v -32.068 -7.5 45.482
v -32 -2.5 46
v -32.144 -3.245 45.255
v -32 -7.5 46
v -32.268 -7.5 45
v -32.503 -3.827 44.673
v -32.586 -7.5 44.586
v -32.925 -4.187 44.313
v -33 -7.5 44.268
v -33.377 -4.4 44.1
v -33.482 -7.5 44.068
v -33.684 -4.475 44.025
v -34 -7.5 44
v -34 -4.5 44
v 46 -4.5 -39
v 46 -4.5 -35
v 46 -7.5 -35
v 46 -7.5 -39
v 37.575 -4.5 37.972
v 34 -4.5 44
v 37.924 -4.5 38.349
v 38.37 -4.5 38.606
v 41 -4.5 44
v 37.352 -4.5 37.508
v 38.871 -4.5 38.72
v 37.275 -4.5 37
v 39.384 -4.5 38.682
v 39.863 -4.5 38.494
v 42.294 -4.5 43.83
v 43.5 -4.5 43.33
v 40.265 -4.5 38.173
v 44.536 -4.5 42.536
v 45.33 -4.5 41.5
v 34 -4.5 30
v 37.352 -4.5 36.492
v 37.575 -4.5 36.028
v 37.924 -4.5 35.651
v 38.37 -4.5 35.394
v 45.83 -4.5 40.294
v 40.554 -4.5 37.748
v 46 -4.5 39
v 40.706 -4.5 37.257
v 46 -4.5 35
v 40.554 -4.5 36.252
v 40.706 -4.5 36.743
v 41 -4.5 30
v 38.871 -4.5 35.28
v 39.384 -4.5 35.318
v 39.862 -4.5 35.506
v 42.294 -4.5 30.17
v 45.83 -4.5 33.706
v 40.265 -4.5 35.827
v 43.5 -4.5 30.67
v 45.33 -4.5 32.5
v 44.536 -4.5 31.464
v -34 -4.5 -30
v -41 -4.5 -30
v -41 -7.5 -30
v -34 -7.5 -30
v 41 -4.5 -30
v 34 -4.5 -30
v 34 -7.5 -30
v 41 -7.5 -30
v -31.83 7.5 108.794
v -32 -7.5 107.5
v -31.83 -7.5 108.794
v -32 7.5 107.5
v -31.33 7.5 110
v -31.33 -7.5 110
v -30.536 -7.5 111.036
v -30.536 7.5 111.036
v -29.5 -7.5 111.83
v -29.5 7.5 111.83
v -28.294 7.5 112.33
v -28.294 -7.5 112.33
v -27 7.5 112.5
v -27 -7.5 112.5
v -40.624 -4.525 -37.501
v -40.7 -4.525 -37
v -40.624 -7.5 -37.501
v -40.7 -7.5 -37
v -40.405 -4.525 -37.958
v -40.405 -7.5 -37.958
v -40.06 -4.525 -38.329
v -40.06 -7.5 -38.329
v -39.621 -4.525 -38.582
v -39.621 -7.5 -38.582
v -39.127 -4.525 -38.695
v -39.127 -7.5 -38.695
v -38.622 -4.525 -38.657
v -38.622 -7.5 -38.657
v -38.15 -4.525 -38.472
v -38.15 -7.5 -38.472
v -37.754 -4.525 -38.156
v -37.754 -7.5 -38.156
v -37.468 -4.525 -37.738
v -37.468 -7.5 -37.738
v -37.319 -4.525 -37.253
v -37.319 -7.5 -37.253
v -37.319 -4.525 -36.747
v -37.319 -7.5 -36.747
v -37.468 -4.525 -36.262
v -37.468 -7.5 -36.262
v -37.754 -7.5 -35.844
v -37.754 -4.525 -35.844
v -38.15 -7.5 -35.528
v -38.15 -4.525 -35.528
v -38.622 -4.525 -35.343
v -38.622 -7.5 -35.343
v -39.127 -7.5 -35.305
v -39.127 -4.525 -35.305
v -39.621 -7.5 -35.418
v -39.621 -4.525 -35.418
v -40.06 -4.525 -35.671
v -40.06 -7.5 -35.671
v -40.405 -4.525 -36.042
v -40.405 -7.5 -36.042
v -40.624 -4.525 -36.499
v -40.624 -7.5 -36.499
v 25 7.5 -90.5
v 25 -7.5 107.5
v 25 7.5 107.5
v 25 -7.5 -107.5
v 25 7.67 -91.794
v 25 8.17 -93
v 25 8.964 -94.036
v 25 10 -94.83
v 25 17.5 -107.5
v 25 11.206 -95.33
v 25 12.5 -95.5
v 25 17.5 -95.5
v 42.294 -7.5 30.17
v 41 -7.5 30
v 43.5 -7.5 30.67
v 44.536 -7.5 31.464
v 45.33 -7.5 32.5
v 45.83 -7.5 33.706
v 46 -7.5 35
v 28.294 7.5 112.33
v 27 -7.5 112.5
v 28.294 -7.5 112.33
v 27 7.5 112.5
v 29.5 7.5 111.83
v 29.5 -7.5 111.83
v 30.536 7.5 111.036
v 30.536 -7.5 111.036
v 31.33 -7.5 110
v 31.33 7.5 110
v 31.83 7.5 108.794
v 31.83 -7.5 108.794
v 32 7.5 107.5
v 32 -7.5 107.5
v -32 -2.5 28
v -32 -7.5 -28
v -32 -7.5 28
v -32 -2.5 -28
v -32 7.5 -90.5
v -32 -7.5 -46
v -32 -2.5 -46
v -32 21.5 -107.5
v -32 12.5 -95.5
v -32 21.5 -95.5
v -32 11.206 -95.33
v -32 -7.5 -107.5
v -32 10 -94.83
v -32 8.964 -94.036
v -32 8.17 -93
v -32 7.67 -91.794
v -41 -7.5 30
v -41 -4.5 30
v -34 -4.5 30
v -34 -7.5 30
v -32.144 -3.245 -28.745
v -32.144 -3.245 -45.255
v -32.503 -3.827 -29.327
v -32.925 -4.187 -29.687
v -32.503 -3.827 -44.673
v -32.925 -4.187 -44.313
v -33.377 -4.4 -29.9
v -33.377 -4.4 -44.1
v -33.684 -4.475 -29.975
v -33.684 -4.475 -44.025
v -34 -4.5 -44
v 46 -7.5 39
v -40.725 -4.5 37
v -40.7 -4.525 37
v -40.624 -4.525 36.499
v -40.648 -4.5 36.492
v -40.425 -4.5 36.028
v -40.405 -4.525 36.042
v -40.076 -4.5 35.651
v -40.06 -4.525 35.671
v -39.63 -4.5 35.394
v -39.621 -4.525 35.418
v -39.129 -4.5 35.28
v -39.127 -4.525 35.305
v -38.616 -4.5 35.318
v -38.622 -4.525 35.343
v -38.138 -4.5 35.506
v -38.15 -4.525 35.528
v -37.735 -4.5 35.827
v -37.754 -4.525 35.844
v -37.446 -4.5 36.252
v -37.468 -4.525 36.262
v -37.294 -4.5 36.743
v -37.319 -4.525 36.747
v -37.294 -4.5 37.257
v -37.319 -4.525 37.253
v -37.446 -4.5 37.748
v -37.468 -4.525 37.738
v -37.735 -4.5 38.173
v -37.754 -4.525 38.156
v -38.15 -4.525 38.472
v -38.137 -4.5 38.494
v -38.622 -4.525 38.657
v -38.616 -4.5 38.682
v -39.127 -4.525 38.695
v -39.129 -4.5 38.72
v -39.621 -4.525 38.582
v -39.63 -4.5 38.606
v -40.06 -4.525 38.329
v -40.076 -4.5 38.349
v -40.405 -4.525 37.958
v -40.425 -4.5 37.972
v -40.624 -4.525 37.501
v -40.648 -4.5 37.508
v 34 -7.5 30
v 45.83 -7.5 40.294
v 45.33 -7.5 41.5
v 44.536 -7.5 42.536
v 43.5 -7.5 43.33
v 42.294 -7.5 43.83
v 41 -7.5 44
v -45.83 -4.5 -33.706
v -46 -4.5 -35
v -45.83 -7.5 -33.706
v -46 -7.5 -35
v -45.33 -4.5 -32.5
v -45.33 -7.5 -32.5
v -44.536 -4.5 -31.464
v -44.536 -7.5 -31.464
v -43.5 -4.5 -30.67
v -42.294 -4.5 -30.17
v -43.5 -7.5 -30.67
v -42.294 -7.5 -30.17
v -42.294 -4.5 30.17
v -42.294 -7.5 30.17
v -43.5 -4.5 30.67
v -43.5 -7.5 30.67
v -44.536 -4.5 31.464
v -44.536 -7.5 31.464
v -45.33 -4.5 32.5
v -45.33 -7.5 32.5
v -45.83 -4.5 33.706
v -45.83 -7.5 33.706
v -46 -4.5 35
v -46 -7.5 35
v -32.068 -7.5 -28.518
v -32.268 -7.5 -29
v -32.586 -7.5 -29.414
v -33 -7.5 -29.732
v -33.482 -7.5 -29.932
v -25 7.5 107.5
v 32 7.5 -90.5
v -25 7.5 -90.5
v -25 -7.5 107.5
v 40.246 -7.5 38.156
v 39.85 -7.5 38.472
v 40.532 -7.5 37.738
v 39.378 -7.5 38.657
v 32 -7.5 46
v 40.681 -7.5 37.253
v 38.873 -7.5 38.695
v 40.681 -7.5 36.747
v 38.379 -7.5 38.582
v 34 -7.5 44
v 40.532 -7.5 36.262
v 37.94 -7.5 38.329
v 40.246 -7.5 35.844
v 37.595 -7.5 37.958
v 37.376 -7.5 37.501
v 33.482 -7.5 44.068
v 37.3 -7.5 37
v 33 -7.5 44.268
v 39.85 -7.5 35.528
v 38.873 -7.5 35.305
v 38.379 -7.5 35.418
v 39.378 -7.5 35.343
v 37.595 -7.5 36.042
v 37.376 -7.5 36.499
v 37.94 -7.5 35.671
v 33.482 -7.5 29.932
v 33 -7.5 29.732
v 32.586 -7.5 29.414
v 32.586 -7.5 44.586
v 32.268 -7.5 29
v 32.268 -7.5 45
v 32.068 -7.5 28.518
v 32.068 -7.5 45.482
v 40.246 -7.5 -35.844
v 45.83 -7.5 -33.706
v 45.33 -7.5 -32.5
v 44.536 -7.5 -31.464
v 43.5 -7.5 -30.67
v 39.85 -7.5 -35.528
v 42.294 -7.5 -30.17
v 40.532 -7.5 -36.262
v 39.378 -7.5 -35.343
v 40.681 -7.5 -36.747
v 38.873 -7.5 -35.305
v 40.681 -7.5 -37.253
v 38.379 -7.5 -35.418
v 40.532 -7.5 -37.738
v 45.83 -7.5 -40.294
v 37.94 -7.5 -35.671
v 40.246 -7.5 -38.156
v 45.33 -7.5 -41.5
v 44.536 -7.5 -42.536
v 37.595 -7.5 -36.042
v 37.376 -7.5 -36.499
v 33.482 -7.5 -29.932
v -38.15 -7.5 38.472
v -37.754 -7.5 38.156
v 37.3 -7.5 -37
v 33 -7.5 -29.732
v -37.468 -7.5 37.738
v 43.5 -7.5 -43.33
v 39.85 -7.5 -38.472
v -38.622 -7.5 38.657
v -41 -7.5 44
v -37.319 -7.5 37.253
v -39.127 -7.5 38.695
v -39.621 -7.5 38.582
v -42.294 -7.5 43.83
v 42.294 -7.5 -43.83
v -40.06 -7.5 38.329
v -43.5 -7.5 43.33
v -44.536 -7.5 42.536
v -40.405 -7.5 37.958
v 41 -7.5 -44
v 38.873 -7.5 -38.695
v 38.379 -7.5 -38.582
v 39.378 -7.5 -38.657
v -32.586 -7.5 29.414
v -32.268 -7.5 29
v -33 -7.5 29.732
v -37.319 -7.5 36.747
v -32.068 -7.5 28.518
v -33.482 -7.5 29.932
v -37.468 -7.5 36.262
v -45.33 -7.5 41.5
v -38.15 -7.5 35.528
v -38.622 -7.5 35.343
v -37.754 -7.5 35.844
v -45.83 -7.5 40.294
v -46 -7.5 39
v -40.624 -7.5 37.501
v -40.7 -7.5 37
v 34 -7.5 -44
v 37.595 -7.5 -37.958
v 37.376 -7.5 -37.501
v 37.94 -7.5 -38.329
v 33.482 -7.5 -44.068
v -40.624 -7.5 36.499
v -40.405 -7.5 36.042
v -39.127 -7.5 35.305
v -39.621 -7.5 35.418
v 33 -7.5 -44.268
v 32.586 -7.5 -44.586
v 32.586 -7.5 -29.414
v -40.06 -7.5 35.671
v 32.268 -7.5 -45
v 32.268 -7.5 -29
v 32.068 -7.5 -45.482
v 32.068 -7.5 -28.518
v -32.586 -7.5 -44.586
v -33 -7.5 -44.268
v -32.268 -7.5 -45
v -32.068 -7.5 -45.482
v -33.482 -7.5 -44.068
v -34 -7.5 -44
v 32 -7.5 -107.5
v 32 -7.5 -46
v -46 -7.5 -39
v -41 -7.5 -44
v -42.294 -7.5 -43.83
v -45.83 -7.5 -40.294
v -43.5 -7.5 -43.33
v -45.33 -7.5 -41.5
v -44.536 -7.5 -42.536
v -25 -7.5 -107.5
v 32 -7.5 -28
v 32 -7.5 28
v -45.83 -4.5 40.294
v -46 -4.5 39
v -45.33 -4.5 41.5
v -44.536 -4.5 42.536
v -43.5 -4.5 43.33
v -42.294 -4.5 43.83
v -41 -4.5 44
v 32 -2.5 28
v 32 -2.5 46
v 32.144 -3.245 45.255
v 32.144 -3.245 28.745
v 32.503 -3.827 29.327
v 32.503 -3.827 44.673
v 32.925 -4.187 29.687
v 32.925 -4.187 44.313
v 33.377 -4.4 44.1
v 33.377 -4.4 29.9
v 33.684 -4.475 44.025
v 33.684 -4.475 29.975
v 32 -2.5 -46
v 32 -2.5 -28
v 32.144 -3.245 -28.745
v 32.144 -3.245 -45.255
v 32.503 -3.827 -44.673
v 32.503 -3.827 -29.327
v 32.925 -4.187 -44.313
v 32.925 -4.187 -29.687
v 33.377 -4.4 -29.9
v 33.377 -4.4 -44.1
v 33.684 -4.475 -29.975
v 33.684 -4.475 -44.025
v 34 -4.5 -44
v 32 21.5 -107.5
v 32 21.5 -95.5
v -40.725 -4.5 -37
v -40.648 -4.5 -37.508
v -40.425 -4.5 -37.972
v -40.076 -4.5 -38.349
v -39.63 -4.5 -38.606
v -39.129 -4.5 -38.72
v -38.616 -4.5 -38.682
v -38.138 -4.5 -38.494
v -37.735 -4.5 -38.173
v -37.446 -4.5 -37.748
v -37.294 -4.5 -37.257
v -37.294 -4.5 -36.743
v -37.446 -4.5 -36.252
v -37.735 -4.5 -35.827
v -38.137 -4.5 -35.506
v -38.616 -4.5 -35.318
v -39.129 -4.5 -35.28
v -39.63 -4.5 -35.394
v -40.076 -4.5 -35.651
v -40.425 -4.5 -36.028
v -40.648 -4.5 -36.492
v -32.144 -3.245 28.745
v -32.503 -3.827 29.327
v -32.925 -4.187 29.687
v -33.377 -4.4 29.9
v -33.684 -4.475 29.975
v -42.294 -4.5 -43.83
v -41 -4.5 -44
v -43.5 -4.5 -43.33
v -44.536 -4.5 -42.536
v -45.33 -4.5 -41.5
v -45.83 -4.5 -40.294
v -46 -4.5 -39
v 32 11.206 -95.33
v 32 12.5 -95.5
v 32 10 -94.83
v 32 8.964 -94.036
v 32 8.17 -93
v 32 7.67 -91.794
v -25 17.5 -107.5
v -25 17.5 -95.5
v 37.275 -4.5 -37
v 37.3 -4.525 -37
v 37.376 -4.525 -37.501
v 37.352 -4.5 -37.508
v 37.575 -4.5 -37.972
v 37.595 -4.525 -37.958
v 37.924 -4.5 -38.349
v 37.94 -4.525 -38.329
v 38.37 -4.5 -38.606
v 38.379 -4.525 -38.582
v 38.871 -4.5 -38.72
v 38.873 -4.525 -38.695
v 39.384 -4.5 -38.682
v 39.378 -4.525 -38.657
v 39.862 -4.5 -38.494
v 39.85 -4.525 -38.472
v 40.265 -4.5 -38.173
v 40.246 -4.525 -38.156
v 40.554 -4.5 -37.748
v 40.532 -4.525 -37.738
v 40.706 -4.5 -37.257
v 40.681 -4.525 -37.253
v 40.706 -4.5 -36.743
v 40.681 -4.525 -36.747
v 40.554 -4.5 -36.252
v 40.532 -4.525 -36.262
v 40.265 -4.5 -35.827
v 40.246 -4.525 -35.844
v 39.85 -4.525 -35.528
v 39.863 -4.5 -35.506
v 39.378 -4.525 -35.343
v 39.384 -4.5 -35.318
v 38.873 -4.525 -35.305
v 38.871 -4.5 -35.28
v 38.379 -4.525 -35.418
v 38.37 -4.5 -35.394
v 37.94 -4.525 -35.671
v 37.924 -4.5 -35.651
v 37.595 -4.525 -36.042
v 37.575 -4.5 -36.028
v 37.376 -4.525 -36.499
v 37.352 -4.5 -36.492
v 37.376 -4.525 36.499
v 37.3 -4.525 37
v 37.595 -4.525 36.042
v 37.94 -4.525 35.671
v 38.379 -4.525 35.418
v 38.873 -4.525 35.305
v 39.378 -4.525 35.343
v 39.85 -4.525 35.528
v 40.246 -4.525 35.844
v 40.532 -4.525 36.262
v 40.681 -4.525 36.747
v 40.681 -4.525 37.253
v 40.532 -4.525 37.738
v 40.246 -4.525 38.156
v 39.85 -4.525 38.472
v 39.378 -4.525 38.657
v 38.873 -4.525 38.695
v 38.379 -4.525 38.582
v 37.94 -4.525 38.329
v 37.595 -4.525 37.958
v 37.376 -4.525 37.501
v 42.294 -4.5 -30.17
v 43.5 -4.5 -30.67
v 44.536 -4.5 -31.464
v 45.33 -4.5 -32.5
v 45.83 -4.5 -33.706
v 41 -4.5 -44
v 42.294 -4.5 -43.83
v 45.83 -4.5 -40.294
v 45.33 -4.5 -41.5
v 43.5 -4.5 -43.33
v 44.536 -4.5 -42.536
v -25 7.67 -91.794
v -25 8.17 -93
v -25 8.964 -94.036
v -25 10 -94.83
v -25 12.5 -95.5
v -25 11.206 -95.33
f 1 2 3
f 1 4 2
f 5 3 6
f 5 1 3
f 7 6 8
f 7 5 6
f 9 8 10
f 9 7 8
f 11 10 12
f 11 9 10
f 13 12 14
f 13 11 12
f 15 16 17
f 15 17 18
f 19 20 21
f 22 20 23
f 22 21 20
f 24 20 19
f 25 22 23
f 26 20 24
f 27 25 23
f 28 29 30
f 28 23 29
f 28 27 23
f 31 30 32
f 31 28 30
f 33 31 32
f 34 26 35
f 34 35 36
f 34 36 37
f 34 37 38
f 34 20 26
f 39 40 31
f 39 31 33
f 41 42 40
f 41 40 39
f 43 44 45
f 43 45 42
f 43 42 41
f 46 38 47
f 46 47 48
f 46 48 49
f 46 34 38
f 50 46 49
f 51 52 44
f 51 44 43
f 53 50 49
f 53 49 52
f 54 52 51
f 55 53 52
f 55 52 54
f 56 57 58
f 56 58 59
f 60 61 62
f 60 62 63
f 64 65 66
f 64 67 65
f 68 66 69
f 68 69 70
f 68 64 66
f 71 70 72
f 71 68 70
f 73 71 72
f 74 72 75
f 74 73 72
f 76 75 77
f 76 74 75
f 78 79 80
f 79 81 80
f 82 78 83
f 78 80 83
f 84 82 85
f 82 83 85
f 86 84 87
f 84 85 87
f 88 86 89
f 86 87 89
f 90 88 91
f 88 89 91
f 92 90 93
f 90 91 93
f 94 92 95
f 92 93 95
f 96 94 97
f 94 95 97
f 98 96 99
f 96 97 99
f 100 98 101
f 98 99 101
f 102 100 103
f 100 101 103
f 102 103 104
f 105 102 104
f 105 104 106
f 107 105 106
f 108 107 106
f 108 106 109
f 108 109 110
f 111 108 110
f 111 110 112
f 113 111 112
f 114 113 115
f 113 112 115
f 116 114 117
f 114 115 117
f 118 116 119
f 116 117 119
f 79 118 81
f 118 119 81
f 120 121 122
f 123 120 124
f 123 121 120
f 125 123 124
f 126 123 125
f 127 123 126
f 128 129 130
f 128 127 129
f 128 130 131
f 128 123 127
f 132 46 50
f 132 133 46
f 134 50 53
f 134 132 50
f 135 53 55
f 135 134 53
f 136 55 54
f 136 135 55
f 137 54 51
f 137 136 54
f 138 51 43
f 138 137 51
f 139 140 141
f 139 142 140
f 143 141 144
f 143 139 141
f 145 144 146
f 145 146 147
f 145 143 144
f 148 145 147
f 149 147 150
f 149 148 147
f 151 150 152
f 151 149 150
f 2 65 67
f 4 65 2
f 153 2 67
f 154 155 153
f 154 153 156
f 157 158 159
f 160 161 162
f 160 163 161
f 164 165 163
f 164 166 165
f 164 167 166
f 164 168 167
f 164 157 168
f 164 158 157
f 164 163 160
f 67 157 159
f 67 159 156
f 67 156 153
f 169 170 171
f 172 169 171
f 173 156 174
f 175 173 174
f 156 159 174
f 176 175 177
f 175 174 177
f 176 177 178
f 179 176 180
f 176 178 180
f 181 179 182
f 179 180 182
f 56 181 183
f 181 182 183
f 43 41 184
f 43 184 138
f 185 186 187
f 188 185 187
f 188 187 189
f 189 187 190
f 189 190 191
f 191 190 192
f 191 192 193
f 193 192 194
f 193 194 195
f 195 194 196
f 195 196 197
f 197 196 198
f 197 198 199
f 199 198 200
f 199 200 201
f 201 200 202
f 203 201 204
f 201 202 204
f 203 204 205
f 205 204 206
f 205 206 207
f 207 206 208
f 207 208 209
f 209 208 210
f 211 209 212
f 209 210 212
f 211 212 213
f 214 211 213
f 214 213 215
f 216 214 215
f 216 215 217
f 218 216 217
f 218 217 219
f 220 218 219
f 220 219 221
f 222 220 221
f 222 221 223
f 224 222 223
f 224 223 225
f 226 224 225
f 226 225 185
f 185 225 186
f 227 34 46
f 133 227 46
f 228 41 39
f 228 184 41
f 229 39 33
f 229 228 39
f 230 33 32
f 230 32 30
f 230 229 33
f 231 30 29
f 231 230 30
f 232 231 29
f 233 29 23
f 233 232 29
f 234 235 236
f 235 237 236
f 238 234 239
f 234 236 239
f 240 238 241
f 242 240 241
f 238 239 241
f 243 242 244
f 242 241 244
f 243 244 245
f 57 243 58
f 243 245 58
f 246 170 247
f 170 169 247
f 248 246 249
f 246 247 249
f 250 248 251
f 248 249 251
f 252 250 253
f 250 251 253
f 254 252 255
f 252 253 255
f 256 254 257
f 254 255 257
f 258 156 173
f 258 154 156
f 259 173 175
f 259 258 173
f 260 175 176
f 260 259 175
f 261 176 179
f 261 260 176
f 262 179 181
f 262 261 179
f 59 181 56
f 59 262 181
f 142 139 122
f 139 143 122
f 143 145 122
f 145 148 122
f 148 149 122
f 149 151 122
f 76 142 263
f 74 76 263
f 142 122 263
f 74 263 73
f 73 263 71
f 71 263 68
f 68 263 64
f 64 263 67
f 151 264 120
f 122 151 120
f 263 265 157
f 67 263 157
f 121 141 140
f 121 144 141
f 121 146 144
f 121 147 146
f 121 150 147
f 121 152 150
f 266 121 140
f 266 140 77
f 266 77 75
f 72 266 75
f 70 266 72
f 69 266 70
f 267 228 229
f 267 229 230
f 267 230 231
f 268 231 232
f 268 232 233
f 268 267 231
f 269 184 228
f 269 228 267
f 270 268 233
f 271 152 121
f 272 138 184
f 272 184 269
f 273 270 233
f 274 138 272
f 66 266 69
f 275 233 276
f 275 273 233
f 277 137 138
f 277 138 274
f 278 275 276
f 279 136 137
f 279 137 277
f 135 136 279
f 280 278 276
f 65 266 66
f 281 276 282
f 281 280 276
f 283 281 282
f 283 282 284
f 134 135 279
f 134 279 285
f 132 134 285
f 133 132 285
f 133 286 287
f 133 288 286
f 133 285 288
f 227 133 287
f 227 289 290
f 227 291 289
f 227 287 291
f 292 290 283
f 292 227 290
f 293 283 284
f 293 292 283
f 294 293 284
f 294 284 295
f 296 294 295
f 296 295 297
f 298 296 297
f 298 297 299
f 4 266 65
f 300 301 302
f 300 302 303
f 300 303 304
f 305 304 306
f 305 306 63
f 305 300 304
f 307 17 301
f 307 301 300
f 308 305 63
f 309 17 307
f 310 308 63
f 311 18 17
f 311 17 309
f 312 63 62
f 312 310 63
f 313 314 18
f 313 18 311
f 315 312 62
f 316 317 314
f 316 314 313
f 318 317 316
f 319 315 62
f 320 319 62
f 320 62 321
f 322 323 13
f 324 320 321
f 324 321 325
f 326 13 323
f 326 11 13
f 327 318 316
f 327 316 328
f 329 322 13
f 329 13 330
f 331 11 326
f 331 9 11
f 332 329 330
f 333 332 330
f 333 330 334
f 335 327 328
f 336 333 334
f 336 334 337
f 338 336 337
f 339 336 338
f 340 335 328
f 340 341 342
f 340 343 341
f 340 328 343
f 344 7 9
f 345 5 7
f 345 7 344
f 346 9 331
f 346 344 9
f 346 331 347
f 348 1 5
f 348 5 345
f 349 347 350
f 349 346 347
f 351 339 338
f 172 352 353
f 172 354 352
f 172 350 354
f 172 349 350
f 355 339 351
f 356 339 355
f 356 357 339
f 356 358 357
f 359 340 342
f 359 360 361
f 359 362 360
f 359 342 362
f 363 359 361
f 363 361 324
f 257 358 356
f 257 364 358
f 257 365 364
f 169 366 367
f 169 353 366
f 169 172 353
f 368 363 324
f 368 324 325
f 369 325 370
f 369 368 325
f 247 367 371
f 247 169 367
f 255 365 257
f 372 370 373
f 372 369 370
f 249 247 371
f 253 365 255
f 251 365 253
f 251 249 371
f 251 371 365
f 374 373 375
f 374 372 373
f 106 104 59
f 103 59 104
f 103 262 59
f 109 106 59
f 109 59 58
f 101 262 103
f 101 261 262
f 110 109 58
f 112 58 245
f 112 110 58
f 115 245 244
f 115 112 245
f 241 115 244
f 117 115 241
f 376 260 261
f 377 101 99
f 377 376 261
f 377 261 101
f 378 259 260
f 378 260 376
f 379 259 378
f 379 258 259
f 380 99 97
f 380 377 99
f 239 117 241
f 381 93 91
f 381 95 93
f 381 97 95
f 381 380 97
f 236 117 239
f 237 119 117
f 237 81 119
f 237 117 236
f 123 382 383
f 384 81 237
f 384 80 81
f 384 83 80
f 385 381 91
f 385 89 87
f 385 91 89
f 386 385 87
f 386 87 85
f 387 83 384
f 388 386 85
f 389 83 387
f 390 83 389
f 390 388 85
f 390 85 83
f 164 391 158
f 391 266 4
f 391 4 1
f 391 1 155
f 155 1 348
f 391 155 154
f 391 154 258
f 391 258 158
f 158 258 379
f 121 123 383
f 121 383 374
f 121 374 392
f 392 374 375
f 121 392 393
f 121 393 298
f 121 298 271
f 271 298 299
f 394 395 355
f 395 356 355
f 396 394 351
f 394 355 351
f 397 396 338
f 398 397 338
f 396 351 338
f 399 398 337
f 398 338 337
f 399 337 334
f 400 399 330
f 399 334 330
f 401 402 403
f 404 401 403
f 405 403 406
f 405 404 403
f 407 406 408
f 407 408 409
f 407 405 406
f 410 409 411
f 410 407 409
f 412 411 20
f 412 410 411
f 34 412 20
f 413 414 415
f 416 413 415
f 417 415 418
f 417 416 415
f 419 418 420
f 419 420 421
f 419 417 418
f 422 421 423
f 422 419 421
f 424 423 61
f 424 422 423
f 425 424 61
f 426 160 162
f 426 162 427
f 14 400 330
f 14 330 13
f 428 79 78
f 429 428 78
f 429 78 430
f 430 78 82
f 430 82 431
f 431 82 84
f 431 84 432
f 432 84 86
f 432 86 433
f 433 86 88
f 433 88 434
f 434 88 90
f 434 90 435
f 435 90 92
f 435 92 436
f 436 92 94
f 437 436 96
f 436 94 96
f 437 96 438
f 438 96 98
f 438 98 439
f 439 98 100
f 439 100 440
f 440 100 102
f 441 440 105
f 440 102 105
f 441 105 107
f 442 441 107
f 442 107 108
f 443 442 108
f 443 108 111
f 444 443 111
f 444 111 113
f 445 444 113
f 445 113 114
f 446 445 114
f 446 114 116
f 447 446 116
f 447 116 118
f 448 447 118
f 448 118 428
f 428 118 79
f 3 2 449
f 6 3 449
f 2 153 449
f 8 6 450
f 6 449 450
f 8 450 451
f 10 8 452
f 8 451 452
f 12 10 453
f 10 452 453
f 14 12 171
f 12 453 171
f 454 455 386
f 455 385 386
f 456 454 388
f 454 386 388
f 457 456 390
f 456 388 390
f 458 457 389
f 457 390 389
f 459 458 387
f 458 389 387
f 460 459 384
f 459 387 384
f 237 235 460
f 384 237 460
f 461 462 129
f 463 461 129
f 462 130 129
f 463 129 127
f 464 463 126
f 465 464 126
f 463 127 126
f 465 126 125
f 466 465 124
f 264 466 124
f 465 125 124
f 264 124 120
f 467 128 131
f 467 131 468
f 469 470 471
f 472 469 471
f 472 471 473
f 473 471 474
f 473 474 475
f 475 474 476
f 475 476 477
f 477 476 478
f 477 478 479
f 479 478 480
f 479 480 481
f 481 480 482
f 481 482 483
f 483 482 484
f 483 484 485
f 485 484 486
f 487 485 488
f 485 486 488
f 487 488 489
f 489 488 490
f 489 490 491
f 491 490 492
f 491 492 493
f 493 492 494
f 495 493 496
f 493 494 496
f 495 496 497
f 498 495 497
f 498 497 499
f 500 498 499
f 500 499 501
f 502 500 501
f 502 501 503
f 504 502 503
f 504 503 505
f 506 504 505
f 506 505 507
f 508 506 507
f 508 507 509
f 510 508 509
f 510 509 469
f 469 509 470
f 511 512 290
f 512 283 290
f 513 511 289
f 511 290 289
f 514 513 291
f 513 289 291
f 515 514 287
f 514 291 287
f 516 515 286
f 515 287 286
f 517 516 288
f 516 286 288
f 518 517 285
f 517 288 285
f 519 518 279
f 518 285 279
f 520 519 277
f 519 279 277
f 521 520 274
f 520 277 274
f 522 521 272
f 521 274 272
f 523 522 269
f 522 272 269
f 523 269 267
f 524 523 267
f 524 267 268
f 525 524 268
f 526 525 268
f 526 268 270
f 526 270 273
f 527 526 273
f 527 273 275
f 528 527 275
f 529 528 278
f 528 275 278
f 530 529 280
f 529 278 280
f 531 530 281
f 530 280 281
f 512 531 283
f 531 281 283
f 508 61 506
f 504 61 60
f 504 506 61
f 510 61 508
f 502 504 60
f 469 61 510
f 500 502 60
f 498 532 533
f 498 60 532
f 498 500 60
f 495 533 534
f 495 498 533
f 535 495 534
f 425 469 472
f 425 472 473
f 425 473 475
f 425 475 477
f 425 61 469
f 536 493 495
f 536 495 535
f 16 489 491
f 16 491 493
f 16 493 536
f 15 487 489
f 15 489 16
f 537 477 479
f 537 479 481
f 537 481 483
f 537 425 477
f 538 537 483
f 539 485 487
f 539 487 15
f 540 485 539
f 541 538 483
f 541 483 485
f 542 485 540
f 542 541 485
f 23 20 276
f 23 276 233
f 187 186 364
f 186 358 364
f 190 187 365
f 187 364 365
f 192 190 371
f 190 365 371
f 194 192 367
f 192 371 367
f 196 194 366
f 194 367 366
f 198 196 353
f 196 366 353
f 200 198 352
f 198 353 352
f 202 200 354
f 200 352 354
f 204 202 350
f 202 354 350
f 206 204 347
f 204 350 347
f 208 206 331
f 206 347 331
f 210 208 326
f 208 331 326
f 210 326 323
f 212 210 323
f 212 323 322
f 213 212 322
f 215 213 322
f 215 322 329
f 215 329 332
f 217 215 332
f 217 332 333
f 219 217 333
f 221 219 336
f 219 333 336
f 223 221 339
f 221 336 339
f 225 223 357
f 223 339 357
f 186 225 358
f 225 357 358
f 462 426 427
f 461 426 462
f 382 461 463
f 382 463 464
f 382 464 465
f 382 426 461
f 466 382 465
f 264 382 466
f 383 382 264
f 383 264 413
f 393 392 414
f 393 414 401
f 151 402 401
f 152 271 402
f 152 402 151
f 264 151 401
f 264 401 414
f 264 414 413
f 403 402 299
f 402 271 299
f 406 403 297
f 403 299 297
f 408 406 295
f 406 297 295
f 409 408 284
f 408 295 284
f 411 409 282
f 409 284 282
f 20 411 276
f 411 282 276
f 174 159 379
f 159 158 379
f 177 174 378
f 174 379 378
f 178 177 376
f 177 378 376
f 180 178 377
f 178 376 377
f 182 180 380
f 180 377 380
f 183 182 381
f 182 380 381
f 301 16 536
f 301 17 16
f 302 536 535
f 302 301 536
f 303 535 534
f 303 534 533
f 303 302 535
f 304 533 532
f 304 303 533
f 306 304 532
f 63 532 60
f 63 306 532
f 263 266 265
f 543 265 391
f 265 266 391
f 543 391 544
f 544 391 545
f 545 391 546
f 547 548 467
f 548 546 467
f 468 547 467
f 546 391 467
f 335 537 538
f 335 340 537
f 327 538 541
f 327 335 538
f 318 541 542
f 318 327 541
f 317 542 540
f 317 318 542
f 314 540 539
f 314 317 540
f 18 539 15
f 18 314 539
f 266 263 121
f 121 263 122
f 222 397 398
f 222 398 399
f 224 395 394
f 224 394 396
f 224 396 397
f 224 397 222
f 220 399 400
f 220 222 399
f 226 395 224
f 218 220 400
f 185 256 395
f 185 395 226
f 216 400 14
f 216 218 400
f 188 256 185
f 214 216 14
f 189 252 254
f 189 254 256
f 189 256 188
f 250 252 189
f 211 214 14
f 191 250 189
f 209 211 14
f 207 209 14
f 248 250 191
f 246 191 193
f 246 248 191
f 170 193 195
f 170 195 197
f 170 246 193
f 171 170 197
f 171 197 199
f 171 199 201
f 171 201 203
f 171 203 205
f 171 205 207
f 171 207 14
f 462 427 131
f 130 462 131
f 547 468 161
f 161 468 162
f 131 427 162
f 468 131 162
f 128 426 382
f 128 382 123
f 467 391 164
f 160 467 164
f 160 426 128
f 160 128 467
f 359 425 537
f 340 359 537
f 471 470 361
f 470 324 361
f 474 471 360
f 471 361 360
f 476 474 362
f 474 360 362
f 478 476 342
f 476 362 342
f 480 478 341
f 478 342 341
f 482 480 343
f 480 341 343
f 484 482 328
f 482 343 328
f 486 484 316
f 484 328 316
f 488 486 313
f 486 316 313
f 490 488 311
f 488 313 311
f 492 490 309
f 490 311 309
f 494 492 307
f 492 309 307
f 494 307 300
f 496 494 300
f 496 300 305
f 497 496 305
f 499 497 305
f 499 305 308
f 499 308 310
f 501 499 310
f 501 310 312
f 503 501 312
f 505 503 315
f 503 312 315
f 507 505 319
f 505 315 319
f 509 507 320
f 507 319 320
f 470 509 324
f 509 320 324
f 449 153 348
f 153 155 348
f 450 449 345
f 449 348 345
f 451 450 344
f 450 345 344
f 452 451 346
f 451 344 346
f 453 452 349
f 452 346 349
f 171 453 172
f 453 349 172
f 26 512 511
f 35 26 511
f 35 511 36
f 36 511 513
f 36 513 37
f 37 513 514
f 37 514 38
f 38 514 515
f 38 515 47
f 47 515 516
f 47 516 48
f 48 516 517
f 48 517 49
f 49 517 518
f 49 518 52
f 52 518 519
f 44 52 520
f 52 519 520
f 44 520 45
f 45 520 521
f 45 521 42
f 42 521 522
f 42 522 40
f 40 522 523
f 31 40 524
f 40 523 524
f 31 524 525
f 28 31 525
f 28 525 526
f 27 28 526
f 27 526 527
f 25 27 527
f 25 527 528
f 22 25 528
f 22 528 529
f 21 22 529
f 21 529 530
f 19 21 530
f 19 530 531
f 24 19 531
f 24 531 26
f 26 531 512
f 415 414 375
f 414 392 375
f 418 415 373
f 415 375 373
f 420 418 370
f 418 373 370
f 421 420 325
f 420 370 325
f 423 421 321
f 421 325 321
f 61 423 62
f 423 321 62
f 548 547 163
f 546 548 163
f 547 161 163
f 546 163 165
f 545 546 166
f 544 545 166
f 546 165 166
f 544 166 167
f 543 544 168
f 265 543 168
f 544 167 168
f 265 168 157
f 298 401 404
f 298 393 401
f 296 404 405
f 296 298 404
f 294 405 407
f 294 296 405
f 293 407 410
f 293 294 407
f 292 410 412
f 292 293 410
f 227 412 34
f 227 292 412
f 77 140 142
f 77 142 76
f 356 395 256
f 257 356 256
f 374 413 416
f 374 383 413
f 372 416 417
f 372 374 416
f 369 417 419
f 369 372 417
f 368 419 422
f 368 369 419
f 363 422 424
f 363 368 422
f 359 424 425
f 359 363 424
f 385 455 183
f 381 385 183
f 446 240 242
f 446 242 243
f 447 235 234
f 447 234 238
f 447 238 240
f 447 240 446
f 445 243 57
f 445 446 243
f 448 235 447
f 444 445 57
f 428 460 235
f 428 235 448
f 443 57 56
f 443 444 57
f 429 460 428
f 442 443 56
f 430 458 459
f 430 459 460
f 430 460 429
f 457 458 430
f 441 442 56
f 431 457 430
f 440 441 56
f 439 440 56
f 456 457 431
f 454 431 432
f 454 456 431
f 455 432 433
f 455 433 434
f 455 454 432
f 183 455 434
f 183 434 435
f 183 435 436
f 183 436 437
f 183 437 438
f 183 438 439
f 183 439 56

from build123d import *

# Parameters (mm, degrees)
BOSS_EXTRUDE1_DEPTH            = 7.5
SKETCH2_W                      = 10
SKETCH2_H                      = 10
BOSS_EXTRUDE2_DEPTH            = 12
CUT_EXTRUDE1_DEPTH             = 124.51619327
CUT_EXTRUDE1_DEPTH_BACK        = 124.51619327
SKETCH4_W                      = 14
SKETCH4_H                      = 14
BOSS_EXTRUDE3_DEPTH            = 15
SKETCH7_W                      = 14
SKETCH7_H                      = 14
CUT_EXTRUDE2_DEPTH             = 12
M3_CLEARANCE_HOLE1_D           = 3.4
M3_CLEARANCE_HOLE1_CSINK_D     = 3.45
M3_CLEARANCE_HOLE1_CSINK_ANGLE = 90
FILLET1_R                      = 2
FILLET2_R                      = 5


with BuildPart() as part:
    # Sketch1 → Boss-Extrude1 (new, symmetric)
    with BuildSketch(Plane(origin=(0, 0, 0), x_dir=(1, 0, 0), z_dir=(0, 1, 0))):
        Polygon((25, 107.5), (35, 107.5), (35, -117.5), (-35, -117.5), (-35, 107.5), (-25, 107.5), (-25, -107.5), (25, -107.5), align=None)
    extrude(amount=BOSS_EXTRUDE1_DEPTH, both=True)

    # Sketch2 → Boss-Extrude2 (add)
    with BuildSketch(Plane(origin=(0, 0, -107.5), x_dir=(-1, 0, 0), z_dir=(0, 0, -1))):
        with Locations((-30, 12.5)):
            Rectangle(SKETCH2_W, SKETCH2_H)
        Polygon((-35, 21.5), (-35, 17.5), (-25, 17.5), (25, 17.5), (35, 17.5), (35, 21.5), align=None)
        with Locations((30, 12.5)):
            Rectangle(SKETCH2_W, SKETCH2_H)
    extrude(amount=-BOSS_EXTRUDE2_DEPTH)

    # Sketch3 → Cut-Extrude1 (cut, two sides: drawn at the far end of the back side and taken through both)
    with BuildSketch(Plane(origin=(0, 7.5, 0), x_dir=(1, 0, 0), z_dir=(0, 1, 0)).offset(-CUT_EXTRUDE1_DEPTH_BACK)):
        Polygon((-35, -117.5), (35, -117.5), (35, -112.5), (35, 107.5), (32, 107.5), (32, -112.5), (-32, -112.5), (-32, 107.5), (-35, 107.5), (-35, -112.5), align=None)
    extrude(amount=CUT_EXTRUDE1_DEPTH + CUT_EXTRUDE1_DEPTH_BACK, mode=Mode.SUBTRACT)

    # Sketch4 → Boss-Extrude3 (add)
    with BuildSketch(Plane(origin=(0, 7.5, 0), x_dir=(1, 0, 0), z_dir=(0, 1, 0))):
        with Locations((-39, 37)):
            Rectangle(SKETCH4_W, SKETCH4_H)
        with Locations((39, -37)):
            Rectangle(SKETCH4_W, SKETCH4_H)
        with Locations((-39, -37)):
            Rectangle(SKETCH4_W, SKETCH4_H)
        with Locations((39, 37)):
            Rectangle(SKETCH4_W, SKETCH4_H)
    extrude(amount=-BOSS_EXTRUDE3_DEPTH)

    # Sketch7 → Cut-Extrude2 (cut)
    with BuildSketch(Plane(origin=(0, 7.5, 0), x_dir=(1, 0, 0), z_dir=(0, 1, 0))):
        with Locations((-39, 37)):
            Rectangle(SKETCH7_W, SKETCH7_H)
        with Locations((39, 37)):
            Rectangle(SKETCH7_W, SKETCH7_H)
        with Locations((39, -37)):
            Rectangle(SKETCH7_W, SKETCH7_H)
        with Locations((-39, -37)):
            Rectangle(SKETCH7_W, SKETCH7_H)
    extrude(amount=-CUT_EXTRUDE2_DEPTH, mode=Mode.SUBTRACT)

    # M3 Clearance Hole1 (through all)
    with Locations(Plane(origin=(0, -4.5, 0), x_dir=(1, 0, 0), z_dir=(0, 1, 0))):
        with Locations((-39, 37), (39, 37), (39, -37), (-39, -37)):
            CounterSinkHole(M3_CLEARANCE_HOLE1_D / 2, M3_CLEARANCE_HOLE1_CSINK_D / 2, counter_sink_angle=M3_CLEARANCE_HOLE1_CSINK_ANGLE)

    # Fillet1
    fillet1_edges = [part.edges().sort_by_distance(p)[0] for p in [
        (-32, -6, -44),
        (-32, -6, -30),
        (-32, -6, 30),
        (-32, -6, 44),
        (32, -6, 30),
        (32, -6, 44),
        (32, -6, -44),
        (32, -6, -30),
        (-32, -4.5, 37),
        (32, -4.5, 37),
        (32, -4.5, -37),
        (-32, -4.5, -37),
    ]]
    fillet(fillet1_edges, radius=FILLET1_R)

    # Fillet2
    fillet2_edges = [part.edges().sort_by_distance(p)[0] for p in [
        (-46, -6, -30),
        (-46, -6, -44),
        (-46, -6, 44),
        (-46, -6, 30),
        (46, -6, 30),
        (46, -6, 44),
        (46, -6, -44),
        (46, -6, -30),
        (-28.5, 7.5, -95.5),
        (28.5, 7.5, -95.5),
        (-32, 0, 112.5),
        (32, 0, 112.5),
    ]]
    fillet(fillet2_edges, radius=FILLET2_R)


solid = part.part
